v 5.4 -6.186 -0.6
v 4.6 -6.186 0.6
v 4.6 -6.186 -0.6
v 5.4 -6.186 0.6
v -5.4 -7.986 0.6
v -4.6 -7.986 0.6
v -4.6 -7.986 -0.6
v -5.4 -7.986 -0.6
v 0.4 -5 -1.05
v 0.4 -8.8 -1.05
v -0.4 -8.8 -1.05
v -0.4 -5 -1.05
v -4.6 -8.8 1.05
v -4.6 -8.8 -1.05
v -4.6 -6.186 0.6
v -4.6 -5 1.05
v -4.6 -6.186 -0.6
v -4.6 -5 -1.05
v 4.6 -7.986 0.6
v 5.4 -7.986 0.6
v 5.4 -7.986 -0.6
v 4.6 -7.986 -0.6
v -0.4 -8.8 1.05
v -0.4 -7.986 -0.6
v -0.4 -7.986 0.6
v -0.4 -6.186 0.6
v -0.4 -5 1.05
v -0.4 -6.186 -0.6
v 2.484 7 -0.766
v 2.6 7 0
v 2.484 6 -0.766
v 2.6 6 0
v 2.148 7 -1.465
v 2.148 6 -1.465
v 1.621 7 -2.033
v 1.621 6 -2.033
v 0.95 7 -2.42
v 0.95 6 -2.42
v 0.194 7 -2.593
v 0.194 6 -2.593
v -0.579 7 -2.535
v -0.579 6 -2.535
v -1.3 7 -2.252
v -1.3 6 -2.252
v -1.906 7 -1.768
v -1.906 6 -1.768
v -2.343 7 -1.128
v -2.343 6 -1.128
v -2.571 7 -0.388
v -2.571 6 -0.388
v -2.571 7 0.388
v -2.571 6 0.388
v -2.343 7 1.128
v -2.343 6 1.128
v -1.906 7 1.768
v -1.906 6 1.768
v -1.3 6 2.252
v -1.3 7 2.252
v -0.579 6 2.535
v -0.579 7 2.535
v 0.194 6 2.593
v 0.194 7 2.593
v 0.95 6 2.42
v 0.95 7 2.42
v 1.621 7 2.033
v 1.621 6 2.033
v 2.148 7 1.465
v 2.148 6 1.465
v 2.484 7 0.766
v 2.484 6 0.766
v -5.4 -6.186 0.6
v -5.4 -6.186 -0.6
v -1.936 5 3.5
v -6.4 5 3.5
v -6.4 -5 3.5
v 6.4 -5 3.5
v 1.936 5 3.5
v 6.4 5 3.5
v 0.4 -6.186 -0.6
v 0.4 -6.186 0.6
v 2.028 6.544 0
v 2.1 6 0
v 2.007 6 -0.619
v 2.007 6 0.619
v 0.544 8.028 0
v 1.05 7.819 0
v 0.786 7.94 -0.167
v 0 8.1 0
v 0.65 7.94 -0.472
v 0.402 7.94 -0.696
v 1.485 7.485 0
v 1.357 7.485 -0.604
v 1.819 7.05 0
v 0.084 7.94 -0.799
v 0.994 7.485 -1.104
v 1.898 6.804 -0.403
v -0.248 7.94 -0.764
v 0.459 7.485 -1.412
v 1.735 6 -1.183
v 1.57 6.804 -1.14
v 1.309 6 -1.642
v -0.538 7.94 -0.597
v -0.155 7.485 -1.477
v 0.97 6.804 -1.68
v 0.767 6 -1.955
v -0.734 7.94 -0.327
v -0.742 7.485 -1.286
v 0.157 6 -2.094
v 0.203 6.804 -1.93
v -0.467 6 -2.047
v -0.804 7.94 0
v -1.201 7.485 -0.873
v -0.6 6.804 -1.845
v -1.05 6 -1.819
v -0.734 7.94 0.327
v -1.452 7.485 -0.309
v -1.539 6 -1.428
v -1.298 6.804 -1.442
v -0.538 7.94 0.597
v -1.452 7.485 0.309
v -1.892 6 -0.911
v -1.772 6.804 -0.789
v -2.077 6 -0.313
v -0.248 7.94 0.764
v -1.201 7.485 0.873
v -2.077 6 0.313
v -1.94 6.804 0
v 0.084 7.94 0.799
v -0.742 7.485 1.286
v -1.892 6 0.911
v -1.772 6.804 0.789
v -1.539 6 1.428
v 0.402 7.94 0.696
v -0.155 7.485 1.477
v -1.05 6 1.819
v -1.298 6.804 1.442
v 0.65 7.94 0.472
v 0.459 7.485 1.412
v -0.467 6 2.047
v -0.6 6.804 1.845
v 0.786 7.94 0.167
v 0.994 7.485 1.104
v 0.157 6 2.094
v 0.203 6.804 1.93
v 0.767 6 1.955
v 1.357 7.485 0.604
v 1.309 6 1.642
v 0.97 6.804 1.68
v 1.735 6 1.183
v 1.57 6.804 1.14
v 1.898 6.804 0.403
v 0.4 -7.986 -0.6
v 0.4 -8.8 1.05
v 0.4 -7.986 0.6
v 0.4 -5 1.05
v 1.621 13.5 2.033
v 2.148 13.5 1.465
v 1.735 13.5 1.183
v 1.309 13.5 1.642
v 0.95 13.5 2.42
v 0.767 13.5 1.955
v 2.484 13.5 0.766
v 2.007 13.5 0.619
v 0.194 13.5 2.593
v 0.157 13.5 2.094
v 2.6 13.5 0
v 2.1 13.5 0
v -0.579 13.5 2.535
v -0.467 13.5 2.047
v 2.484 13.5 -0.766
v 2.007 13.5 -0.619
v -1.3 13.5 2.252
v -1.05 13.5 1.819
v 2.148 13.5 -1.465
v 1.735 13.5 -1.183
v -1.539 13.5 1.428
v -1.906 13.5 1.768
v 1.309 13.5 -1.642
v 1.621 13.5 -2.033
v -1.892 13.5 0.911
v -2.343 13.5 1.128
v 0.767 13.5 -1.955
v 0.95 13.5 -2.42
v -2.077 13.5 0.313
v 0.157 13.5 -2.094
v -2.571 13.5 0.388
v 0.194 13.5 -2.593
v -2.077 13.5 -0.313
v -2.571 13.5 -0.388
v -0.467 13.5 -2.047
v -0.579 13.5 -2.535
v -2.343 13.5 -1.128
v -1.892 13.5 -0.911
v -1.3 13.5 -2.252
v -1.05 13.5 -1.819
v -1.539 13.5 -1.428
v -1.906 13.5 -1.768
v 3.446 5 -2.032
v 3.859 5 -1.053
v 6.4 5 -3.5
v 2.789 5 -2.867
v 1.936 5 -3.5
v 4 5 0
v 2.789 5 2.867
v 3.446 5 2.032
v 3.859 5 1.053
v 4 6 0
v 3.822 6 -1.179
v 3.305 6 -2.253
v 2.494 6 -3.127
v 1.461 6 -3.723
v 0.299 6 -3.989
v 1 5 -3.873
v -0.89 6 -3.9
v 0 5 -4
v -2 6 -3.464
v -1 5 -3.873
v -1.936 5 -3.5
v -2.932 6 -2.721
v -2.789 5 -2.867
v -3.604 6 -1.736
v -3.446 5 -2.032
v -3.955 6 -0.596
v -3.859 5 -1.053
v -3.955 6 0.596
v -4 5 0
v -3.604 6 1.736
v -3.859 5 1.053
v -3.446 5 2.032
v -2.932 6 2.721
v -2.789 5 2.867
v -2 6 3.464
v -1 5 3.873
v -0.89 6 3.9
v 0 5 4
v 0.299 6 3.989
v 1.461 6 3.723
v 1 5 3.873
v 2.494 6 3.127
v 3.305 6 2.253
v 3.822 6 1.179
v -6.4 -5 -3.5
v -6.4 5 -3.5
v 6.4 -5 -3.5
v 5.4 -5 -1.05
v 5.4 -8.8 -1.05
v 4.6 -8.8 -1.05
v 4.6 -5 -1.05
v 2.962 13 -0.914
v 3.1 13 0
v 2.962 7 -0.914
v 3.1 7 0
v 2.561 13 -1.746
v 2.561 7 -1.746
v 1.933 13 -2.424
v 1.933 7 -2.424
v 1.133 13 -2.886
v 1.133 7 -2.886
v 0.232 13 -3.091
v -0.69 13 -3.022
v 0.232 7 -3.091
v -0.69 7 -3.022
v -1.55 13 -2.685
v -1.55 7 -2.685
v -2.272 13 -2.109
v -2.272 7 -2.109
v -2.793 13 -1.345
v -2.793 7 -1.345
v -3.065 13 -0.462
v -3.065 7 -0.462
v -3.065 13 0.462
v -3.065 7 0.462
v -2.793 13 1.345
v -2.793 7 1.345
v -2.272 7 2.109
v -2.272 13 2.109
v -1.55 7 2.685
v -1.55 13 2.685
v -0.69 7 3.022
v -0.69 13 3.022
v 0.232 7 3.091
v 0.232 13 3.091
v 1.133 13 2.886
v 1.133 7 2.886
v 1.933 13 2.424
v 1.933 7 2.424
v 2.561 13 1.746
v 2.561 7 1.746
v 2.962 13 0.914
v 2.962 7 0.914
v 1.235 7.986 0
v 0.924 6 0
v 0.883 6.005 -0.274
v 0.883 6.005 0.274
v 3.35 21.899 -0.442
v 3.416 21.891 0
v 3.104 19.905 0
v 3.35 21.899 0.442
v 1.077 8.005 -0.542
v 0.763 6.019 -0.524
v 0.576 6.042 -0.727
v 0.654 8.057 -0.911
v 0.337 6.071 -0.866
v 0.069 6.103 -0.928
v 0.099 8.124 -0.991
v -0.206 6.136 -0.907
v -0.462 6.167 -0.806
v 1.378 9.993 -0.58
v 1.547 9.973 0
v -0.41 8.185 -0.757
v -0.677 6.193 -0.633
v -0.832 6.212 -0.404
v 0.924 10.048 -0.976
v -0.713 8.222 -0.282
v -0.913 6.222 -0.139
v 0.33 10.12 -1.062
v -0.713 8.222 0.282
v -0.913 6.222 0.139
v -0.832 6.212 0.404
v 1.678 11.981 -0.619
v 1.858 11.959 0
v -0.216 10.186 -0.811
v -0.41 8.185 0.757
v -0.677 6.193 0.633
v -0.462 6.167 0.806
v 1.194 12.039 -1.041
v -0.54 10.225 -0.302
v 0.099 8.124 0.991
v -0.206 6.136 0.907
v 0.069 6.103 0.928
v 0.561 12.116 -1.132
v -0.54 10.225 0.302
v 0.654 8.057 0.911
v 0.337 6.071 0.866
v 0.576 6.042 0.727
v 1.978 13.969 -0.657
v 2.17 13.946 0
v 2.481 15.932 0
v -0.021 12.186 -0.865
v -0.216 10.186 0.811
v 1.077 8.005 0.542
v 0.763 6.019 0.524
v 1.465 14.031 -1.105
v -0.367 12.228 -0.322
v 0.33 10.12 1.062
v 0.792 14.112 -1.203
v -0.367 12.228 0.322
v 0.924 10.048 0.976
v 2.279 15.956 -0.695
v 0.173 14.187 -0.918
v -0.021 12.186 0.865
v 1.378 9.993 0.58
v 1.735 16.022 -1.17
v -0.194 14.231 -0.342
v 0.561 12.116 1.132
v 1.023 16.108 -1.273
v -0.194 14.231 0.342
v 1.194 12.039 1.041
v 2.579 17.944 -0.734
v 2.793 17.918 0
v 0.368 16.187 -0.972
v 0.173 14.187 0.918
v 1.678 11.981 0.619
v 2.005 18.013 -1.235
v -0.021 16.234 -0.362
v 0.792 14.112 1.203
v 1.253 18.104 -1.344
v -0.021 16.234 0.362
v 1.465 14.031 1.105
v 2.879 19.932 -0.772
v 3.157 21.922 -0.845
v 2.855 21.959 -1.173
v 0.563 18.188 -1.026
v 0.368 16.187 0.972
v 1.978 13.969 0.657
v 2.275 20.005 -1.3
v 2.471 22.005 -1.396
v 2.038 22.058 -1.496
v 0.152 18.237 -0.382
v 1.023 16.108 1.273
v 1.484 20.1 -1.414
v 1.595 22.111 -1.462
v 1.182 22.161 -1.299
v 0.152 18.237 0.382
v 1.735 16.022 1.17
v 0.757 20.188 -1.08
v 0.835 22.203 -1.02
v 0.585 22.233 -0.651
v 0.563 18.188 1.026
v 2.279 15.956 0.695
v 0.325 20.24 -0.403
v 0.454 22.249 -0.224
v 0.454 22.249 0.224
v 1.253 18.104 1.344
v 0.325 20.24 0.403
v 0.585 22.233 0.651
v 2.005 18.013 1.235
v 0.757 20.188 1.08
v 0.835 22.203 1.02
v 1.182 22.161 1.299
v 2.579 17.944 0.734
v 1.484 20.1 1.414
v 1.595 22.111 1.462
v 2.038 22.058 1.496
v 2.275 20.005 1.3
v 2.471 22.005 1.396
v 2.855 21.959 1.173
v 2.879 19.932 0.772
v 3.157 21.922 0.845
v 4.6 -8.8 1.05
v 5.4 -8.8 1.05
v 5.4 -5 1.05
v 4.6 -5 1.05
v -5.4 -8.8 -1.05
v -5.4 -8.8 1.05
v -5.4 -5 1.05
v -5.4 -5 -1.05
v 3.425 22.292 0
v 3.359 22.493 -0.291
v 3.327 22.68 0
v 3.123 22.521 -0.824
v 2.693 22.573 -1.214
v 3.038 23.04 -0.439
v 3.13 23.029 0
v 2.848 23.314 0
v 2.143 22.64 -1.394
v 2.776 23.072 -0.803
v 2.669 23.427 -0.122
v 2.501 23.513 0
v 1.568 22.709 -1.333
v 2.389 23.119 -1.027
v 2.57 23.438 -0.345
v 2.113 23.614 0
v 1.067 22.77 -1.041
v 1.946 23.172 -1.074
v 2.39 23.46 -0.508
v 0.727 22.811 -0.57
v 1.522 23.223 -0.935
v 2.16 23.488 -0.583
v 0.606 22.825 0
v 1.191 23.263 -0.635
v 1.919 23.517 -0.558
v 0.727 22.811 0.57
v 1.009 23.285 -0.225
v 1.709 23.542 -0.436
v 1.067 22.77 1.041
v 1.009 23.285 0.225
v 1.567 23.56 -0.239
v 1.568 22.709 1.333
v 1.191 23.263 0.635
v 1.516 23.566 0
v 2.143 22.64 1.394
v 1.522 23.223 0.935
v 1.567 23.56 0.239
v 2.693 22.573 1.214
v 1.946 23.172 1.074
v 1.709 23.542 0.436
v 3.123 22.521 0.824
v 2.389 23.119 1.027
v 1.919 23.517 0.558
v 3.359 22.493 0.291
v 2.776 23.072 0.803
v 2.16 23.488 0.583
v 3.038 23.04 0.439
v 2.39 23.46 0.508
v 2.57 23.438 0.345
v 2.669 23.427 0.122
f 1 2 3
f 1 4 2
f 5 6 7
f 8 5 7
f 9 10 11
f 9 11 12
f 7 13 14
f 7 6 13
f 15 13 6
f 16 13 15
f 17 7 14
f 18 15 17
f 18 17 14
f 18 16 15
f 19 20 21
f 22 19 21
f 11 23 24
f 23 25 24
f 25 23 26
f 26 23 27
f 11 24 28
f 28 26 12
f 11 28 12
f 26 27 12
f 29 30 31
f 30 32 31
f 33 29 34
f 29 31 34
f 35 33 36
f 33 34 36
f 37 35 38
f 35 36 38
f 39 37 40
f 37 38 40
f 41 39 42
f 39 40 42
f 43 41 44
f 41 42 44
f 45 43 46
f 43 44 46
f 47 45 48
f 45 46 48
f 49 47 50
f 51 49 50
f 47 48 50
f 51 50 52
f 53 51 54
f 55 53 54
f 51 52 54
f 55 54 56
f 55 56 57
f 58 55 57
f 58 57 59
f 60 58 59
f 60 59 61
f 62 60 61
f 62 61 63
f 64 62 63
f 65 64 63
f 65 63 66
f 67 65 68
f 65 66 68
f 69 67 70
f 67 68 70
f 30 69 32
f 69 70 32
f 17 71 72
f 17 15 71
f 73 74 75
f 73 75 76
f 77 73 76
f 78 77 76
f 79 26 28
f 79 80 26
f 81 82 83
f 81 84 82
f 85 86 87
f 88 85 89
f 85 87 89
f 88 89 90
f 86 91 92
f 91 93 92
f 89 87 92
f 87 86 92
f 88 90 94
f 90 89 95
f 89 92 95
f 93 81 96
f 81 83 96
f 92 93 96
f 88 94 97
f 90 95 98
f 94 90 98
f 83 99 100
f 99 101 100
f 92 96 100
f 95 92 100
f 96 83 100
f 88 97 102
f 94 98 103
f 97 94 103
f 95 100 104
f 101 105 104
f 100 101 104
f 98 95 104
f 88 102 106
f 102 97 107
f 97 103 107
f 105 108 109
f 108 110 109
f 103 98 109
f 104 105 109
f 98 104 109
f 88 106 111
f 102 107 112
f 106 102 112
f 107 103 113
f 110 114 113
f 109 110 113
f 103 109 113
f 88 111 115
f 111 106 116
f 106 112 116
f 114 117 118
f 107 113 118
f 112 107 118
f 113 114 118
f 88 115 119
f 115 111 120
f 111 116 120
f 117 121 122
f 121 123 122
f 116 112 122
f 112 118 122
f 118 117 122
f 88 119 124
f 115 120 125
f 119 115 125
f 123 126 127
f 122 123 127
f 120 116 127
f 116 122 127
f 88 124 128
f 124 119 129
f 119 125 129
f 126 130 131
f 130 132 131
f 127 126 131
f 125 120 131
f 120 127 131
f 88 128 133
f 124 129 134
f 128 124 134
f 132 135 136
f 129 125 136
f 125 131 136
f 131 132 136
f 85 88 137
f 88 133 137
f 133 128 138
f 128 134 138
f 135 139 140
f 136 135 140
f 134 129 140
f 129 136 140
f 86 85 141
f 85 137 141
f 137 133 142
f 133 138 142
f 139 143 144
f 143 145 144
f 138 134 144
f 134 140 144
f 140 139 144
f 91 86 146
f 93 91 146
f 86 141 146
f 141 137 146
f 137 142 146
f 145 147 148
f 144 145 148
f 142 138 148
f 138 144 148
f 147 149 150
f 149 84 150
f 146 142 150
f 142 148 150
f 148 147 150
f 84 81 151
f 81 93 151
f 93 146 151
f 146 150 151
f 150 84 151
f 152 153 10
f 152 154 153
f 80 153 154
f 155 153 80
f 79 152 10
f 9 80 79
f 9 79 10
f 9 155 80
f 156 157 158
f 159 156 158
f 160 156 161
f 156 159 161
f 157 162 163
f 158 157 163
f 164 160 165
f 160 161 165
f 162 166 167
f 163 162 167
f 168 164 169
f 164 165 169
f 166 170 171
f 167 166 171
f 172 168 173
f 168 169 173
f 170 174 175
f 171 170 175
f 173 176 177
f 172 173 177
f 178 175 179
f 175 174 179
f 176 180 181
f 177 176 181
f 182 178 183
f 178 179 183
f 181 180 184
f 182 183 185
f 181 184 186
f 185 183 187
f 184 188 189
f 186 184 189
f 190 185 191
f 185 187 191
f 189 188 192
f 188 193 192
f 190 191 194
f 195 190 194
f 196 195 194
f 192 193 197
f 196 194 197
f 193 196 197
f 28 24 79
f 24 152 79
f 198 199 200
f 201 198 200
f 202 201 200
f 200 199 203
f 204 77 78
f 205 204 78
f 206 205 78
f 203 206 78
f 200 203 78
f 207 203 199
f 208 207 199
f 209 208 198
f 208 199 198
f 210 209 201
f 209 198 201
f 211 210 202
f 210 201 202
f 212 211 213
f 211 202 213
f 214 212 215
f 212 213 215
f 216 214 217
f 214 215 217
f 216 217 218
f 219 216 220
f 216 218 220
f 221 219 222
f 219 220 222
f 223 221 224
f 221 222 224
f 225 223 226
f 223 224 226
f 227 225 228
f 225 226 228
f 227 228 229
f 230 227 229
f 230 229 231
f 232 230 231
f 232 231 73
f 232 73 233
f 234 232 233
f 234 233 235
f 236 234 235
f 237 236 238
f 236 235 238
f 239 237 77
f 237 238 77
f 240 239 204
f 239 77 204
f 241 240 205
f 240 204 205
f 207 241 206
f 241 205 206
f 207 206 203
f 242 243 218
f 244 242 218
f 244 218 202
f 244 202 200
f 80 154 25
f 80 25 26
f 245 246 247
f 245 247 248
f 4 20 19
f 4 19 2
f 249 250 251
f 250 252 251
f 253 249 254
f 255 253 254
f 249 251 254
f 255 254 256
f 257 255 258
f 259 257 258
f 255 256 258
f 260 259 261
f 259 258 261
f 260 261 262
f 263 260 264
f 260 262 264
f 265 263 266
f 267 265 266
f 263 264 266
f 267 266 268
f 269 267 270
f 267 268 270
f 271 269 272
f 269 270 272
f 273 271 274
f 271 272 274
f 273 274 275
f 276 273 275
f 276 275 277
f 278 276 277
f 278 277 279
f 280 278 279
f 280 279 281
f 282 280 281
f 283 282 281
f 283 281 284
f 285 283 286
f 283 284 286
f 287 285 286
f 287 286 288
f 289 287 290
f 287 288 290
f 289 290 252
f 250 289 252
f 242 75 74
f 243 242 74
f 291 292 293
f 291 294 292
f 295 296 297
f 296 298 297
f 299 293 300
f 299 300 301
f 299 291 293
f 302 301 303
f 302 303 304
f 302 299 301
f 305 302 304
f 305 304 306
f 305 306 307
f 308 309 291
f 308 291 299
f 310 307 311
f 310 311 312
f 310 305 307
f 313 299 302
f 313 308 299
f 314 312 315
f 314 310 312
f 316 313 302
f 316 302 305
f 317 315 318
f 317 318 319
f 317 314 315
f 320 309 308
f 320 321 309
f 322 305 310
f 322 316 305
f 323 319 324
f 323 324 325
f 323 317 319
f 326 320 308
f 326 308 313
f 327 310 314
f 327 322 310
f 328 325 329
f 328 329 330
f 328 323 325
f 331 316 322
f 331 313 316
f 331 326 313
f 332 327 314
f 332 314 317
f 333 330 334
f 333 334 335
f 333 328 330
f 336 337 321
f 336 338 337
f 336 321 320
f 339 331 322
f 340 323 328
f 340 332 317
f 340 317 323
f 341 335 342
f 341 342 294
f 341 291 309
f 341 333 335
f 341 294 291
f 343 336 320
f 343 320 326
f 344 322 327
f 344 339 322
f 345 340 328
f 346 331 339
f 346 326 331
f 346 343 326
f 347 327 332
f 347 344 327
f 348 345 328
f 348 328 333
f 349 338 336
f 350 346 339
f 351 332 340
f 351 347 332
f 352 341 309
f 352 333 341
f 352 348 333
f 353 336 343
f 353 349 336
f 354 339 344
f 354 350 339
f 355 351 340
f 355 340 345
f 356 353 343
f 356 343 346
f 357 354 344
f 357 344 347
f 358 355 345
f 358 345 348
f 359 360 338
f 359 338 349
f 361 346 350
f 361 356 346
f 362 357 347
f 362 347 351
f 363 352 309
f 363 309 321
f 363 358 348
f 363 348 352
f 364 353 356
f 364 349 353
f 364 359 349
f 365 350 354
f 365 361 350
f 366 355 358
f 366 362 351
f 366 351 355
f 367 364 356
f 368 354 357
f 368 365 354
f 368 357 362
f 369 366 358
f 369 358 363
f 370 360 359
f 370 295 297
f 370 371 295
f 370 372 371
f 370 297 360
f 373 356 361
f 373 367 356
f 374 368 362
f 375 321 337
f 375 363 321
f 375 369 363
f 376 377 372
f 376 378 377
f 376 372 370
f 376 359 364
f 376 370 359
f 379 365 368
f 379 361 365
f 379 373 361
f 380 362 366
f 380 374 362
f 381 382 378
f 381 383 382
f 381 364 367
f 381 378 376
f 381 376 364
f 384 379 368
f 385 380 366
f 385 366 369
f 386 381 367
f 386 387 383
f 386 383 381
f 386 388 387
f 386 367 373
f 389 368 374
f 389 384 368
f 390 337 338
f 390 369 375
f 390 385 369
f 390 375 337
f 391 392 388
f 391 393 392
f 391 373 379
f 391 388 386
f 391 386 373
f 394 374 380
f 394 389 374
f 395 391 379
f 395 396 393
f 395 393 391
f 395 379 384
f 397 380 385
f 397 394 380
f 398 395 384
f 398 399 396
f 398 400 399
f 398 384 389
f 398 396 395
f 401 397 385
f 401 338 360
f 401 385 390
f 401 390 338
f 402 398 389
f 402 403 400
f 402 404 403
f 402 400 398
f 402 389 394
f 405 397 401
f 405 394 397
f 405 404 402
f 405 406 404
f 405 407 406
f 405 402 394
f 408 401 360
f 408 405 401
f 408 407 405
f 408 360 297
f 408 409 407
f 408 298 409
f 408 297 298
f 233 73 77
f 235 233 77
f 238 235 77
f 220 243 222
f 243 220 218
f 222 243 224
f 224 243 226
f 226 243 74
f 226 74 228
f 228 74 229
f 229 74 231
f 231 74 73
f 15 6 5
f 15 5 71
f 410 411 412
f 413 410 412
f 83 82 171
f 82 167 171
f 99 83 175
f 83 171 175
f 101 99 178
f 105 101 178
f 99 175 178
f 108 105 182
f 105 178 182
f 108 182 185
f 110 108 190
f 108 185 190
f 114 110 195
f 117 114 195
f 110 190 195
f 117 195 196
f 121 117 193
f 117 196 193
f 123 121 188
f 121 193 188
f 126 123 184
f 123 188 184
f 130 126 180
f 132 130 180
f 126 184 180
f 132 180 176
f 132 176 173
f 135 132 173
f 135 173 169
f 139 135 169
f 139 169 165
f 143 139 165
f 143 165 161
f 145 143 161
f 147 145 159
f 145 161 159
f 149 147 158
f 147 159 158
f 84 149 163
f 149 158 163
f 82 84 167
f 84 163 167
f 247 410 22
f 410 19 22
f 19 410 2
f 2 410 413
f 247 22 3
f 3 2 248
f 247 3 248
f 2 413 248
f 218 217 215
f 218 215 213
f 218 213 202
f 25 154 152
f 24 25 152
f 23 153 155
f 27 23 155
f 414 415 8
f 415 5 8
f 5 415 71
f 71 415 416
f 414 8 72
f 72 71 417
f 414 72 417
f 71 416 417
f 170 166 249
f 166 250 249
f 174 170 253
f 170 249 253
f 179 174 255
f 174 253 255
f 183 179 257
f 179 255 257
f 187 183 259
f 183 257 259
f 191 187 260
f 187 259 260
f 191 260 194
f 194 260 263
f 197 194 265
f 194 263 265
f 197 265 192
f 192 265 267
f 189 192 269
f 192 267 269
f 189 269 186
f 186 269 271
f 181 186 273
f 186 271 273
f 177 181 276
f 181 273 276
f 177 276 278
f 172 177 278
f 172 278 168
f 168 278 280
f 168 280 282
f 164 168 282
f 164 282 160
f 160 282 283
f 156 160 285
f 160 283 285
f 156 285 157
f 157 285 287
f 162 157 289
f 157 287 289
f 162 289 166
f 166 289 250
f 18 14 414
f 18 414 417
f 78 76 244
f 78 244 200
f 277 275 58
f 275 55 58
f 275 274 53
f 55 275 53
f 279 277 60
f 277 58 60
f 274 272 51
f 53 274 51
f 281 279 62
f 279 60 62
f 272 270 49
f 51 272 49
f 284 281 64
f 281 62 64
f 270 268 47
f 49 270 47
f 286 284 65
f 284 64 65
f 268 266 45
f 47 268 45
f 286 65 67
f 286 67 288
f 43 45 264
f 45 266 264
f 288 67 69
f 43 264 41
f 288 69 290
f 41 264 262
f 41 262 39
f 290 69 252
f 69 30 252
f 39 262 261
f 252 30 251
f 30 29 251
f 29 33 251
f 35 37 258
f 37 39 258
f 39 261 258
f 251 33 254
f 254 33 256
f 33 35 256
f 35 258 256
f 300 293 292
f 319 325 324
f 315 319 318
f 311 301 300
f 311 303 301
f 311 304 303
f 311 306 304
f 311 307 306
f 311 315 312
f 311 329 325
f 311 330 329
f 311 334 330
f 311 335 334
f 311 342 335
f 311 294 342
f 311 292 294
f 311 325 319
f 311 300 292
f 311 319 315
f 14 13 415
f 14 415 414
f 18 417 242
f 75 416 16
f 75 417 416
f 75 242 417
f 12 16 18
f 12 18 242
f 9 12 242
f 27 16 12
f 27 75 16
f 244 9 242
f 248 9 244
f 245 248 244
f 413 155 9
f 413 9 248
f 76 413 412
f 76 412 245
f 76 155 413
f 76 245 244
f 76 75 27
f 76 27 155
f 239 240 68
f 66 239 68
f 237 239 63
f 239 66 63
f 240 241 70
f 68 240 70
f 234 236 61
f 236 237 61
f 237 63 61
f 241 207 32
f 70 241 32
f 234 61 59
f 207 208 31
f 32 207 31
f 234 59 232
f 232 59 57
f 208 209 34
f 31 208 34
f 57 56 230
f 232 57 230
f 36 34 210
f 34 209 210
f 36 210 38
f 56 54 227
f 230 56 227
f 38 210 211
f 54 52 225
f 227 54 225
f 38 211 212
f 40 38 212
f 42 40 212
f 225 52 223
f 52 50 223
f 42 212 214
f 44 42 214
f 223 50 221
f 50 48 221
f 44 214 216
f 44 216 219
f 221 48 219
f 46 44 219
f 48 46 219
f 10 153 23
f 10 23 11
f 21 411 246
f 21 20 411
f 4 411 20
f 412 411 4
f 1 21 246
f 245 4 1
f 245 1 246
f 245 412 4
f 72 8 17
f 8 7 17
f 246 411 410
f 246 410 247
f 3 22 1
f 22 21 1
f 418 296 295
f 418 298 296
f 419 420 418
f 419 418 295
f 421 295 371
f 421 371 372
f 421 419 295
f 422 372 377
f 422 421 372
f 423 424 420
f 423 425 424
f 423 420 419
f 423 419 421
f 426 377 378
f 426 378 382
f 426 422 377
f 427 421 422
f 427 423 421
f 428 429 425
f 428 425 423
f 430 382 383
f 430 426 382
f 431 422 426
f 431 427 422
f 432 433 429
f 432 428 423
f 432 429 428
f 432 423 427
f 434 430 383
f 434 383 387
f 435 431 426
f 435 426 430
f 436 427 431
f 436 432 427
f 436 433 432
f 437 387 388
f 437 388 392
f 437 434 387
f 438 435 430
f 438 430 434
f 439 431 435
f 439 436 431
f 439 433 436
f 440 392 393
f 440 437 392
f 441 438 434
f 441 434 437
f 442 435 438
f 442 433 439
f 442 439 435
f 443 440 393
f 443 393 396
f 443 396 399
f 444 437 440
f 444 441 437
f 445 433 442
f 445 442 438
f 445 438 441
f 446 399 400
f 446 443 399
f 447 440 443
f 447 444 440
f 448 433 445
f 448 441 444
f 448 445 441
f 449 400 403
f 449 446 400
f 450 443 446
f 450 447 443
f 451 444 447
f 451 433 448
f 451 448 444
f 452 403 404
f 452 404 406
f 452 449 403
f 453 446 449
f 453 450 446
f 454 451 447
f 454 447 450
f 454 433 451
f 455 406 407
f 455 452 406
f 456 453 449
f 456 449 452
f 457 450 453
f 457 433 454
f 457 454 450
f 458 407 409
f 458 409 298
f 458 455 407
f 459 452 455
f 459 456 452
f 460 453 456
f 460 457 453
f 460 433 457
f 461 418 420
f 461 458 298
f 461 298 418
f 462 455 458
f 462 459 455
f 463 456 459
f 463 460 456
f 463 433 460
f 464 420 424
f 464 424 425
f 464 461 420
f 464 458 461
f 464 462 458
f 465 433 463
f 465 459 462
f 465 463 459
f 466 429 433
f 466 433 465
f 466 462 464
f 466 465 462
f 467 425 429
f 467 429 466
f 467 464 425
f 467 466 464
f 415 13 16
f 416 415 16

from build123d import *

# Parameters (mm, degrees)
SKETCH1_W           = 12.8
SKETCH1_H           = 10
BOSS_EXTRUDE1_DEPTH = 3.5
SKETCH4_W           = 2.1
SKETCH4_H           = 3.8
SKETCH4_W_2         = 1.2
SKETCH4_H_2         = 1.8
BOSS_EXTRUDE2_DEPTH = 0.4
LPATTERN1_COUNT     = 2
LPATTERN1_PITCH     = 5
LPATTERN1_COL_COUNT = 2
LPATTERN1_COL_PITCH = 5


with BuildPart() as part:
    # Sketch1 → Boss-Extrude1 (new, symmetric)
    with BuildSketch(Plane.XY):
        Rectangle(SKETCH1_W, SKETCH1_H)
    extrude(amount=BOSS_EXTRUDE1_DEPTH, both=True)

    # Sketch3 → Revolve1 (revolve)
    with BuildSketch(Plane.XY):
        with BuildLine():
            Line((0, 5), (0, 8.1))
            ThreePointArc((0, 8.1), (1.48492424, 7.48492424), (2.1, 6))
            Line((2.1, 6), (2.1, 13.5))
            Line((2.1, 13.5), (2.6, 13.5))
            Line((2.6, 13.5), (3.1, 13))
            Line((3.1, 13), (3.1, 7))
            Line((3.1, 7), (2.6, 7))
            Line((2.6, 7), (2.6, 6))
            Line((2.6, 6), (4, 6))
            Line((4, 6), (4, 5))
            Line((4, 5), (0, 5))
        make_face()
    revolve(axis=Axis((0, 5, 0), (0, 1, 0)))

    # Sketch4 → Boss-Extrude2 (add, symmetric)
    with BuildSketch(Plane(origin=(0, 0, 0), x_dir=(0, 0, -1), z_dir=(1, 0, 0))):
        with Locations((0, -6.9)):
            Rectangle(SKETCH4_W, SKETCH4_H)
        with Locations((0, -7.085714286)):
            Rectangle(SKETCH4_W_2, SKETCH4_H_2, mode=Mode.SUBTRACT)
    boss_extrude2 = extrude(amount=BOSS_EXTRUDE2_DEPTH, both=True)

    # LPattern1: Boss-Extrude2 ×2
    with Locations(*[(i * LPATTERN1_PITCH, 0, 0) for i in range(1, LPATTERN1_COUNT)]):
        add(boss_extrude2)

    # LPattern1 col: Boss-Extrude2 ×2
    with Locations(*[(-i * LPATTERN1_COL_PITCH, 0, 0) for i in range(1, LPATTERN1_COL_COUNT)]):
        add(boss_extrude2)


with BuildPart() as body_2:
    # Sketch5 → Revolve4 (revolve)
    with BuildSketch(Plane.XY):
        with BuildLine():
            Line((2.113131909, 23.613833993), (0.914491781, 13.685930799))
            Line((0.914491781, 13.685930799), (2.1, 13.5))
            Line((2.1, 13.5), (3.416038199, 21.891154746))
            ThreePointArc((3.416038199, 21.891154746), (3.130331543, 23.029117776), (2.113131909, 23.613833993))
        make_face()
        Polygon((0.914491781, 13.685930799), (0, 6.111525722), (0.923727271, 6), (2.1, 13.5), align=None)
    revolve(axis=Axis((0, 6.111525722, 0), (0.11986401280529146, 0.9927903194704373, 0)))


solid = Compound([part.part, body_2.part])
